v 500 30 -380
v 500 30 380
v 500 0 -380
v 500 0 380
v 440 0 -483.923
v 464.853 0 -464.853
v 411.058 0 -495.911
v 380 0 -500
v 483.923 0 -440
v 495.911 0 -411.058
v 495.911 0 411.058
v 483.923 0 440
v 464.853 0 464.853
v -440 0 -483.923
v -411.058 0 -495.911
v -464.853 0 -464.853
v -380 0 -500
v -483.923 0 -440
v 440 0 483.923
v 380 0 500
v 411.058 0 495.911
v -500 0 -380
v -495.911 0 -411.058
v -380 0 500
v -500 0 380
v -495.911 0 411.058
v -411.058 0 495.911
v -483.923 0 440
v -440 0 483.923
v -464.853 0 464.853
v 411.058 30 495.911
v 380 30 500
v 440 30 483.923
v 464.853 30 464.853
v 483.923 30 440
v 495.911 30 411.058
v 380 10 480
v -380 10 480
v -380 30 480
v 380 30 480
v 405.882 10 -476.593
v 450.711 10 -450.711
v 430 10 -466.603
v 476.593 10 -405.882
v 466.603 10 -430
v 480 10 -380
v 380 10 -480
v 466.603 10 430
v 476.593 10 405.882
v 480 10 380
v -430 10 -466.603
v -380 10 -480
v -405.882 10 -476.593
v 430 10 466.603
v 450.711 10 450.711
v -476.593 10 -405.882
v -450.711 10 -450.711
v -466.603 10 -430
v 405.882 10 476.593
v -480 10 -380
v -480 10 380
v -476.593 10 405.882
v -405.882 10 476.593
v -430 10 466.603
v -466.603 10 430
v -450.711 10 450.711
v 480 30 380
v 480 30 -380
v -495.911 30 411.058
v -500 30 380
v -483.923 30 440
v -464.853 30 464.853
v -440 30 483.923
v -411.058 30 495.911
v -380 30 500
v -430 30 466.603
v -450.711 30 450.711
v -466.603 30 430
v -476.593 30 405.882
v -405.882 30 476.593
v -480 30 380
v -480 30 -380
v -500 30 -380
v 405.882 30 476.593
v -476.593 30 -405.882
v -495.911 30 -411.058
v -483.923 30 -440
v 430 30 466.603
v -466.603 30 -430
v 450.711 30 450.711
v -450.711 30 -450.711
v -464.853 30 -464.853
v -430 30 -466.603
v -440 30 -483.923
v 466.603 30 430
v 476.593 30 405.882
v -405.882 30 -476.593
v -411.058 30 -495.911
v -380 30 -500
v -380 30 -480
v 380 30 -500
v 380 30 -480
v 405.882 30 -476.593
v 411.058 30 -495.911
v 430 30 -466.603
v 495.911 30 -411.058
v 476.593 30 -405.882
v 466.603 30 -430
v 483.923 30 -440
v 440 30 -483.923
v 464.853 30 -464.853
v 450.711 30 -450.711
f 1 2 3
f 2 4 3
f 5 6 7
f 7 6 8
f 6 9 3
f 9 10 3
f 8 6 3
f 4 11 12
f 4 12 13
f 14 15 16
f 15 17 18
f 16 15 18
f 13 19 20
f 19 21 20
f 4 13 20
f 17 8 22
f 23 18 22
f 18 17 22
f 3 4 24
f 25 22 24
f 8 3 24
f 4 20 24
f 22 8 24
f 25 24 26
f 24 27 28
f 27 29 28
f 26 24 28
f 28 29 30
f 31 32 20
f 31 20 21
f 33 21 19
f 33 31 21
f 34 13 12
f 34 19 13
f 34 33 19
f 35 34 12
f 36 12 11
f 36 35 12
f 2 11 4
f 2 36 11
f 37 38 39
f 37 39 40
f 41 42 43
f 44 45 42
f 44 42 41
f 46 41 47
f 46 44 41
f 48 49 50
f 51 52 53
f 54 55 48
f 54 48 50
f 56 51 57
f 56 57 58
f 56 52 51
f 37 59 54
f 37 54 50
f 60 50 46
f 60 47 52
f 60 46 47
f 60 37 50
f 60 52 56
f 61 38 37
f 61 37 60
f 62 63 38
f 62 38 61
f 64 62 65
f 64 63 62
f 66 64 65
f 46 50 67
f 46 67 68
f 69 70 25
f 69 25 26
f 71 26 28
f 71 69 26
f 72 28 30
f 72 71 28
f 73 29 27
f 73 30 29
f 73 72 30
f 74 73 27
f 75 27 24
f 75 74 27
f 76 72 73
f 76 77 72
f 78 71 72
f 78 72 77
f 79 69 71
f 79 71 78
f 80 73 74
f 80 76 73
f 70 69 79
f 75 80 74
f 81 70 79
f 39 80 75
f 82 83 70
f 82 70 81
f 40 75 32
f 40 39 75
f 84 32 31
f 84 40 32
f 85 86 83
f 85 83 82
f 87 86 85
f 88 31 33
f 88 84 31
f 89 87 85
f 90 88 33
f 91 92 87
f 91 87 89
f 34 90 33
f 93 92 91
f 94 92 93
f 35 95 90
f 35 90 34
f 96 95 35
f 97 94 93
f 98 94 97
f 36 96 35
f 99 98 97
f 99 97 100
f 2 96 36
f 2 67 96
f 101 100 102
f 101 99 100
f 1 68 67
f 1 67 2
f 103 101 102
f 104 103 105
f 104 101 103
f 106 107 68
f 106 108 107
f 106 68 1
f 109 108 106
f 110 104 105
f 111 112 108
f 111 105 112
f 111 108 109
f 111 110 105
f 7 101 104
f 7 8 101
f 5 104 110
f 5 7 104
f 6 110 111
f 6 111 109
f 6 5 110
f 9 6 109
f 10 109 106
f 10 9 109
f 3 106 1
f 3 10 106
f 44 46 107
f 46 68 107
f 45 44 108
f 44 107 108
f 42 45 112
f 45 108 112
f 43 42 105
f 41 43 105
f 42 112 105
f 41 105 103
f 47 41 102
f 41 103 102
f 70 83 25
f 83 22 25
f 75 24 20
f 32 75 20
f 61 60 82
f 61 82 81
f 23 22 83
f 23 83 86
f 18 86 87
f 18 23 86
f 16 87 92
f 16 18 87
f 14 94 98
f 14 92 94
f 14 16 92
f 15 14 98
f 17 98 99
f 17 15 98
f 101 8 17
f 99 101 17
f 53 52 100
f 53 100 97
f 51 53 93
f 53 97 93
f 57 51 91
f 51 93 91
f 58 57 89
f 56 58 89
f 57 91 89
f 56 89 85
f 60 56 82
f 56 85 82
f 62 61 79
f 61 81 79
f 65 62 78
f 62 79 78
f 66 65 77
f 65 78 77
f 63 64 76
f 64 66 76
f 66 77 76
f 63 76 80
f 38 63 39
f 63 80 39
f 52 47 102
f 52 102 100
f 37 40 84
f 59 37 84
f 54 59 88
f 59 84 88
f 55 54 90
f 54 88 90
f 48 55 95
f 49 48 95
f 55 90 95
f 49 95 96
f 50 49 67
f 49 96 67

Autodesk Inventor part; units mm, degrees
ref_plane "YZ Plane" through (0, 0, 0) normal (1, 0, 0) x (0, 1, 0)
ref_plane "XZ Plane" through (0, 0, 0) normal (0, 1, 0) x (-1, 0, 0)
ref_plane "XY Plane" through (0, 0, 0) normal (0, 0, 1) x (1, 0, 0)
sketch "Sketch1" plane through (0, 0, 0) normal (0, 1, 0) x (-1, 0, 0)
  line L0 (500, 500) -> (-500, 500)
  line L1 (-500, 500) -> (-500, -500)
  line L2 (-500, -500) -> (500, -500)
  line L3 (500, -500) -> (500, 500)
  point P0 (0, 0)
  point P1 (0, 500)
  point P2 (500, 0)
  dimension "d1" = 1000
  dimension "d2" = 1000
extrude "Extrusion1" add sketch "Sketch1" along normal blind 10
sketch "Sketch2" plane through (0, 10, 0) normal (0, 1, 0) x (1, 0, 0)
  line L0 (-480, -480) -> (480, -480)
  line L1 (480, -480) -> (480, 480)
  line L2 (480, 480) -> (-480, 480)
  line L3 (-480, 480) -> (-480, -480)
  line L4 (-500, 500) -> (-500, -500) projected
  line L5 (-500, -500) -> (500, -500) projected
  line L6 (500, -500) -> (500, 500) projected
  line L7 (500, 500) -> (-500, 500) projected
  point P0 (0, 0)
  dimension "d5" = 20
  dimension "d6" = 20
  dimension "d8" = 20
  dimension "d9" = 20
extrude "Extrusion2" add sketch "Sketch2" along normal blind 20
fillet "Fillet1" radius 100 4 edges at (-480, 20, 480) (-480, 20, -480) (480, 20, -480) (480, 20, 480)
fillet "Fillet2" radius 120 4 edges at (-500, 15, 500) (-500, 15, -500) (500, 15, -500) (500, 15, 500)
equation "\"d6\" = d5"
equation "\"d8\" = d5"
equation "\"d9\" = d5"
properties part number "ground"
